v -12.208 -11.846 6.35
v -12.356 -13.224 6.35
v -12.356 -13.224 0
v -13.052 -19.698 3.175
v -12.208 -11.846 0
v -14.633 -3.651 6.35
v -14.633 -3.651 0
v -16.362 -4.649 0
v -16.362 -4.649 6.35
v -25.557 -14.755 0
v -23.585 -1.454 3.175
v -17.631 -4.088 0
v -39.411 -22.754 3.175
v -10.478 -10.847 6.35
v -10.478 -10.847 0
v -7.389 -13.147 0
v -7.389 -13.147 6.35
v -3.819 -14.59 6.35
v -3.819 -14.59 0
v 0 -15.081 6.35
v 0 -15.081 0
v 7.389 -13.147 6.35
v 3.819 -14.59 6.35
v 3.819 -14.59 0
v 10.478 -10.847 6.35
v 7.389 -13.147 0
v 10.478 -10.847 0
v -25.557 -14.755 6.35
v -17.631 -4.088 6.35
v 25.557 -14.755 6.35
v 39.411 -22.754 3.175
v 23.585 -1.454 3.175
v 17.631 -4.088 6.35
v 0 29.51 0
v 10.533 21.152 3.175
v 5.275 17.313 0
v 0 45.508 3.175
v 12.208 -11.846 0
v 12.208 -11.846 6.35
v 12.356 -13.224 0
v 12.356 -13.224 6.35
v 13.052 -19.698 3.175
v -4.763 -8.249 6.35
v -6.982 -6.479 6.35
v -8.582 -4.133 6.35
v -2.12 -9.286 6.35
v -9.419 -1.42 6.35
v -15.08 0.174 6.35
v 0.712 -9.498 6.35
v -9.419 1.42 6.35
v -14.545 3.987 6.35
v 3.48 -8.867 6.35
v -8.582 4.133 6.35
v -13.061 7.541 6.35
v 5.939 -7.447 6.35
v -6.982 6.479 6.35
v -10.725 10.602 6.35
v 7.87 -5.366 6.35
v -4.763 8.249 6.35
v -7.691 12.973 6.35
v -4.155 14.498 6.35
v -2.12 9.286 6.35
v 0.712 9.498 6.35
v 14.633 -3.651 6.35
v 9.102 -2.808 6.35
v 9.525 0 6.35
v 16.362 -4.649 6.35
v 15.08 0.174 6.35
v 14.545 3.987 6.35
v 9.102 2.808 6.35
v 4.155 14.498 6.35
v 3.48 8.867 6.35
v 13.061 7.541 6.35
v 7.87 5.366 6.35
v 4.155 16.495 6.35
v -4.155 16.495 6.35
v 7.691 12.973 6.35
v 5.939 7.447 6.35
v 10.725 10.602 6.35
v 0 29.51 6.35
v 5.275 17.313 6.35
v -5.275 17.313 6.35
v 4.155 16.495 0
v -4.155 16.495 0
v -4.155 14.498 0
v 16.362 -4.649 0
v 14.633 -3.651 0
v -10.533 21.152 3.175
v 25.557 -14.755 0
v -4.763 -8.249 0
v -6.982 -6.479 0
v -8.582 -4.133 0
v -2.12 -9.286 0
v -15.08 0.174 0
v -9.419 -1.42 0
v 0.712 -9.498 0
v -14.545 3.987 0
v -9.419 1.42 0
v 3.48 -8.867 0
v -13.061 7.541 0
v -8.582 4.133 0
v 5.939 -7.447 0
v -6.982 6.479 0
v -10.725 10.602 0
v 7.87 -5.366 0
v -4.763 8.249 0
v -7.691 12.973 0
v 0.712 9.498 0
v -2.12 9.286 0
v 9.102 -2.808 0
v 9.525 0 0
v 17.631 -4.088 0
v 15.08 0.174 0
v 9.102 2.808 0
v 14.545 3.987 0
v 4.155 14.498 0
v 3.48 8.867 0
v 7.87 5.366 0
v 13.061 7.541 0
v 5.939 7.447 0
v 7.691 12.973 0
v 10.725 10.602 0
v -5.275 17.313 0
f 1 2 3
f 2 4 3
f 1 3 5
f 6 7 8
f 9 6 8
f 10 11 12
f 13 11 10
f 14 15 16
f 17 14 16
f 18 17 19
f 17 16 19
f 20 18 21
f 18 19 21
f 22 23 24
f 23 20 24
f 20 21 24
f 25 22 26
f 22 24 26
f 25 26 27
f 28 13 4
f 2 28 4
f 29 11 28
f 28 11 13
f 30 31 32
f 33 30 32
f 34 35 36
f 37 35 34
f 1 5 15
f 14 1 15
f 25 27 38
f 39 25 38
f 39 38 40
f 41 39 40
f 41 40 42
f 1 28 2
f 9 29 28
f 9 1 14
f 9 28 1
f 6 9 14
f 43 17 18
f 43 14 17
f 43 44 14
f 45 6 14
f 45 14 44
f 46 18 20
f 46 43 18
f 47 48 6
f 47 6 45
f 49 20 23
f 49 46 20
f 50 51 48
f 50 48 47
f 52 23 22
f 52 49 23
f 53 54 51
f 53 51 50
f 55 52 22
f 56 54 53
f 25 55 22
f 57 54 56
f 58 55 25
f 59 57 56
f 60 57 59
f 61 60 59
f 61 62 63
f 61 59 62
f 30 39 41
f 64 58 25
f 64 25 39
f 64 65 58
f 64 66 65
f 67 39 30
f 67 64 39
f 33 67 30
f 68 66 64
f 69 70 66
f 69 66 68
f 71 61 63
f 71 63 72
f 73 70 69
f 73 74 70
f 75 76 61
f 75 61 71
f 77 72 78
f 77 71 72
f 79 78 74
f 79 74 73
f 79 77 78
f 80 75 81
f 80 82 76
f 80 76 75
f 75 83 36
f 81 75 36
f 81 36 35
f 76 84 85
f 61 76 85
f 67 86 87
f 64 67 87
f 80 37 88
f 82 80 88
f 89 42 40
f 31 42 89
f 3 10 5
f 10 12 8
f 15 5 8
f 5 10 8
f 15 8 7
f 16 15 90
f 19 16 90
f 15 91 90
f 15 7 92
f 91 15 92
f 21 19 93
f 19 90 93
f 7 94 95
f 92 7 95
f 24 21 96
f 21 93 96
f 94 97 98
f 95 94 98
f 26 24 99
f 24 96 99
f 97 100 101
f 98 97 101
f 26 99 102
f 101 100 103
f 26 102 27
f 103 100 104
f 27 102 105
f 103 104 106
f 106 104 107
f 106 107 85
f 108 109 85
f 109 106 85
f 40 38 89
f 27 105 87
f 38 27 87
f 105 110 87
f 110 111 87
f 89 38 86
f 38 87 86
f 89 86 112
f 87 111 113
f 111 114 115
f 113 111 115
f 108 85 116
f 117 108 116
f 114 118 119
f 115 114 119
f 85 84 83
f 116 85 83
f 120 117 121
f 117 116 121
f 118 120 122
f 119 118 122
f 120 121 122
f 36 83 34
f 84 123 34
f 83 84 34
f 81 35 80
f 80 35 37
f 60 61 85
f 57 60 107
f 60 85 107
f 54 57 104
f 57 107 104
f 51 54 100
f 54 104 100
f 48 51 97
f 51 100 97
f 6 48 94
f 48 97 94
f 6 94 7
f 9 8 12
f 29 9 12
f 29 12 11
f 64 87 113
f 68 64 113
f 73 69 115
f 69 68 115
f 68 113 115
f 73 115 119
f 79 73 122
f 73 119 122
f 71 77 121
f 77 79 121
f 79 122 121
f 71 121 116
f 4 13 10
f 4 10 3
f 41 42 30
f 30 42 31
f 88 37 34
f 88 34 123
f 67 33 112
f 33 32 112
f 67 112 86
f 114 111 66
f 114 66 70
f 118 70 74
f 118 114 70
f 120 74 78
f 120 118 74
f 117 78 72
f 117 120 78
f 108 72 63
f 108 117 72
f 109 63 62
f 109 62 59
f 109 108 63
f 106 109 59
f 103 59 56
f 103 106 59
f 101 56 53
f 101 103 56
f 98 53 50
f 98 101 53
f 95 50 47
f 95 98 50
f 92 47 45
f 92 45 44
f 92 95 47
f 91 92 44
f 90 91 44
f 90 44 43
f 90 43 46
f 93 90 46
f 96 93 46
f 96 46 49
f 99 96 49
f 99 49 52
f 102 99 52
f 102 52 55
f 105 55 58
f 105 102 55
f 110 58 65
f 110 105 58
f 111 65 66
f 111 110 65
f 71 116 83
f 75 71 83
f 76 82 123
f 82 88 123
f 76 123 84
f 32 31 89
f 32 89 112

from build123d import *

# Parameters (mm, degrees)
F0_R            = 15.08125
F0_R_2          = 9.525
F1_DEPTH        = 6.35
F3_DEPTH        = 6.35
F3_COPIES_COUNT = 3
F4_SIZE2        = 3.175
F4_SIZE         = 6.35
F4_2_SIZE2      = 3.17499
F4_2_SIZE       = 6.34999


# Not quite as in the source:
# - a fillet or chamfer is up to 0.001 mm smaller than in the source, because OpenCascade refuses the exact size
# - a pattern or mirror of a feature is missing from the dataset's text; its kind, count and spacing are read off the source's solid


with BuildPart() as f1:
    # F0 (on Top) → F1 (new body)
    with BuildSketch(Plane.XY):
        Circle(F0_R)
        Circle(F0_R_2, mode=Mode.SUBTRACT)
    extrude(amount=F1_DEPTH)

    # F2 (on Top) → F3 (join, through all)
    with BuildSketch(Plane.XY):
        with BuildLine():
            Line((10.532929562, 21.1518518627), (0, 45.5084554851))
            Line((0, 45.5084554851), (-10.532929562, 21.1518518627))
            Line((-10.532929562, 21.1518518627), (-4.1548195295, 16.4949237317))
            Line((-4.1548195295, 16.4949237317), (-4.1548195295, 14.497640368))
            ThreePointArc((-4.1548195295, 14.497640368), (0, 15.08125), (4.1548195295, 14.497640368))
            Line((4.1548195295, 14.497640368), (4.1548195295, 16.4949237317))
            Line((4.1548195295, 16.4949237317), (10.532929562, 21.1518518627))
        make_face()
    f3 = extrude(amount=F3_DEPTH)

    # F3_copies: F3 ×3 about axis
    f3_copies_axis = Axis((0, 0, 0), (0, 0, 1))
    for i in range(1, F3_COPIES_COUNT):
        add(f3.rotate(f3_copies_axis, i * 360 / F3_COPIES_COUNT))

    # F4
    f4_edges = [f1.edges().sort_by_distance(p)[0] for p in [
        (-5.266465, 33.330154, 0),
        (5.266465, 33.330154, 0),
        (-31.497992, -12.104185, 0),
        (-26.231527, -21.225969, 0),
        (26.231527, -21.225969, 0),
        (31.497992, -12.104185, 0),
    ]]
    f4_side = f1.faces().sort_by_distance((3.11209, 15.496282, 0))[0]
    chamfer(f4_edges, length=F4_SIZE, length2=F4_SIZE2, reference=f4_side)

    # F4#2 (size 6.35 and 3.175 in the source; OpenCascade refuses exactly that, so slightly less here)
    f4_2_edges = [f1.edges().sort_by_distance(p)[0] for p in [
        (-5.266465, 33.330154, 6.35),
        (5.266465, 33.330154, 6.35),
        (-31.497992, -12.104185, 6.35),
        (-26.231527, -21.225969, 6.35),
        (26.231527, -21.225969, 6.35),
        (31.497992, -12.104185, 6.35),
    ]]
    f4_2_side = f1.faces().sort_by_distance((12.157715, 7.01926, 6.35))[0]
    chamfer(f4_2_edges, length=F4_2_SIZE, length2=F4_2_SIZE2, reference=f4_2_side)


solid = f1.part
